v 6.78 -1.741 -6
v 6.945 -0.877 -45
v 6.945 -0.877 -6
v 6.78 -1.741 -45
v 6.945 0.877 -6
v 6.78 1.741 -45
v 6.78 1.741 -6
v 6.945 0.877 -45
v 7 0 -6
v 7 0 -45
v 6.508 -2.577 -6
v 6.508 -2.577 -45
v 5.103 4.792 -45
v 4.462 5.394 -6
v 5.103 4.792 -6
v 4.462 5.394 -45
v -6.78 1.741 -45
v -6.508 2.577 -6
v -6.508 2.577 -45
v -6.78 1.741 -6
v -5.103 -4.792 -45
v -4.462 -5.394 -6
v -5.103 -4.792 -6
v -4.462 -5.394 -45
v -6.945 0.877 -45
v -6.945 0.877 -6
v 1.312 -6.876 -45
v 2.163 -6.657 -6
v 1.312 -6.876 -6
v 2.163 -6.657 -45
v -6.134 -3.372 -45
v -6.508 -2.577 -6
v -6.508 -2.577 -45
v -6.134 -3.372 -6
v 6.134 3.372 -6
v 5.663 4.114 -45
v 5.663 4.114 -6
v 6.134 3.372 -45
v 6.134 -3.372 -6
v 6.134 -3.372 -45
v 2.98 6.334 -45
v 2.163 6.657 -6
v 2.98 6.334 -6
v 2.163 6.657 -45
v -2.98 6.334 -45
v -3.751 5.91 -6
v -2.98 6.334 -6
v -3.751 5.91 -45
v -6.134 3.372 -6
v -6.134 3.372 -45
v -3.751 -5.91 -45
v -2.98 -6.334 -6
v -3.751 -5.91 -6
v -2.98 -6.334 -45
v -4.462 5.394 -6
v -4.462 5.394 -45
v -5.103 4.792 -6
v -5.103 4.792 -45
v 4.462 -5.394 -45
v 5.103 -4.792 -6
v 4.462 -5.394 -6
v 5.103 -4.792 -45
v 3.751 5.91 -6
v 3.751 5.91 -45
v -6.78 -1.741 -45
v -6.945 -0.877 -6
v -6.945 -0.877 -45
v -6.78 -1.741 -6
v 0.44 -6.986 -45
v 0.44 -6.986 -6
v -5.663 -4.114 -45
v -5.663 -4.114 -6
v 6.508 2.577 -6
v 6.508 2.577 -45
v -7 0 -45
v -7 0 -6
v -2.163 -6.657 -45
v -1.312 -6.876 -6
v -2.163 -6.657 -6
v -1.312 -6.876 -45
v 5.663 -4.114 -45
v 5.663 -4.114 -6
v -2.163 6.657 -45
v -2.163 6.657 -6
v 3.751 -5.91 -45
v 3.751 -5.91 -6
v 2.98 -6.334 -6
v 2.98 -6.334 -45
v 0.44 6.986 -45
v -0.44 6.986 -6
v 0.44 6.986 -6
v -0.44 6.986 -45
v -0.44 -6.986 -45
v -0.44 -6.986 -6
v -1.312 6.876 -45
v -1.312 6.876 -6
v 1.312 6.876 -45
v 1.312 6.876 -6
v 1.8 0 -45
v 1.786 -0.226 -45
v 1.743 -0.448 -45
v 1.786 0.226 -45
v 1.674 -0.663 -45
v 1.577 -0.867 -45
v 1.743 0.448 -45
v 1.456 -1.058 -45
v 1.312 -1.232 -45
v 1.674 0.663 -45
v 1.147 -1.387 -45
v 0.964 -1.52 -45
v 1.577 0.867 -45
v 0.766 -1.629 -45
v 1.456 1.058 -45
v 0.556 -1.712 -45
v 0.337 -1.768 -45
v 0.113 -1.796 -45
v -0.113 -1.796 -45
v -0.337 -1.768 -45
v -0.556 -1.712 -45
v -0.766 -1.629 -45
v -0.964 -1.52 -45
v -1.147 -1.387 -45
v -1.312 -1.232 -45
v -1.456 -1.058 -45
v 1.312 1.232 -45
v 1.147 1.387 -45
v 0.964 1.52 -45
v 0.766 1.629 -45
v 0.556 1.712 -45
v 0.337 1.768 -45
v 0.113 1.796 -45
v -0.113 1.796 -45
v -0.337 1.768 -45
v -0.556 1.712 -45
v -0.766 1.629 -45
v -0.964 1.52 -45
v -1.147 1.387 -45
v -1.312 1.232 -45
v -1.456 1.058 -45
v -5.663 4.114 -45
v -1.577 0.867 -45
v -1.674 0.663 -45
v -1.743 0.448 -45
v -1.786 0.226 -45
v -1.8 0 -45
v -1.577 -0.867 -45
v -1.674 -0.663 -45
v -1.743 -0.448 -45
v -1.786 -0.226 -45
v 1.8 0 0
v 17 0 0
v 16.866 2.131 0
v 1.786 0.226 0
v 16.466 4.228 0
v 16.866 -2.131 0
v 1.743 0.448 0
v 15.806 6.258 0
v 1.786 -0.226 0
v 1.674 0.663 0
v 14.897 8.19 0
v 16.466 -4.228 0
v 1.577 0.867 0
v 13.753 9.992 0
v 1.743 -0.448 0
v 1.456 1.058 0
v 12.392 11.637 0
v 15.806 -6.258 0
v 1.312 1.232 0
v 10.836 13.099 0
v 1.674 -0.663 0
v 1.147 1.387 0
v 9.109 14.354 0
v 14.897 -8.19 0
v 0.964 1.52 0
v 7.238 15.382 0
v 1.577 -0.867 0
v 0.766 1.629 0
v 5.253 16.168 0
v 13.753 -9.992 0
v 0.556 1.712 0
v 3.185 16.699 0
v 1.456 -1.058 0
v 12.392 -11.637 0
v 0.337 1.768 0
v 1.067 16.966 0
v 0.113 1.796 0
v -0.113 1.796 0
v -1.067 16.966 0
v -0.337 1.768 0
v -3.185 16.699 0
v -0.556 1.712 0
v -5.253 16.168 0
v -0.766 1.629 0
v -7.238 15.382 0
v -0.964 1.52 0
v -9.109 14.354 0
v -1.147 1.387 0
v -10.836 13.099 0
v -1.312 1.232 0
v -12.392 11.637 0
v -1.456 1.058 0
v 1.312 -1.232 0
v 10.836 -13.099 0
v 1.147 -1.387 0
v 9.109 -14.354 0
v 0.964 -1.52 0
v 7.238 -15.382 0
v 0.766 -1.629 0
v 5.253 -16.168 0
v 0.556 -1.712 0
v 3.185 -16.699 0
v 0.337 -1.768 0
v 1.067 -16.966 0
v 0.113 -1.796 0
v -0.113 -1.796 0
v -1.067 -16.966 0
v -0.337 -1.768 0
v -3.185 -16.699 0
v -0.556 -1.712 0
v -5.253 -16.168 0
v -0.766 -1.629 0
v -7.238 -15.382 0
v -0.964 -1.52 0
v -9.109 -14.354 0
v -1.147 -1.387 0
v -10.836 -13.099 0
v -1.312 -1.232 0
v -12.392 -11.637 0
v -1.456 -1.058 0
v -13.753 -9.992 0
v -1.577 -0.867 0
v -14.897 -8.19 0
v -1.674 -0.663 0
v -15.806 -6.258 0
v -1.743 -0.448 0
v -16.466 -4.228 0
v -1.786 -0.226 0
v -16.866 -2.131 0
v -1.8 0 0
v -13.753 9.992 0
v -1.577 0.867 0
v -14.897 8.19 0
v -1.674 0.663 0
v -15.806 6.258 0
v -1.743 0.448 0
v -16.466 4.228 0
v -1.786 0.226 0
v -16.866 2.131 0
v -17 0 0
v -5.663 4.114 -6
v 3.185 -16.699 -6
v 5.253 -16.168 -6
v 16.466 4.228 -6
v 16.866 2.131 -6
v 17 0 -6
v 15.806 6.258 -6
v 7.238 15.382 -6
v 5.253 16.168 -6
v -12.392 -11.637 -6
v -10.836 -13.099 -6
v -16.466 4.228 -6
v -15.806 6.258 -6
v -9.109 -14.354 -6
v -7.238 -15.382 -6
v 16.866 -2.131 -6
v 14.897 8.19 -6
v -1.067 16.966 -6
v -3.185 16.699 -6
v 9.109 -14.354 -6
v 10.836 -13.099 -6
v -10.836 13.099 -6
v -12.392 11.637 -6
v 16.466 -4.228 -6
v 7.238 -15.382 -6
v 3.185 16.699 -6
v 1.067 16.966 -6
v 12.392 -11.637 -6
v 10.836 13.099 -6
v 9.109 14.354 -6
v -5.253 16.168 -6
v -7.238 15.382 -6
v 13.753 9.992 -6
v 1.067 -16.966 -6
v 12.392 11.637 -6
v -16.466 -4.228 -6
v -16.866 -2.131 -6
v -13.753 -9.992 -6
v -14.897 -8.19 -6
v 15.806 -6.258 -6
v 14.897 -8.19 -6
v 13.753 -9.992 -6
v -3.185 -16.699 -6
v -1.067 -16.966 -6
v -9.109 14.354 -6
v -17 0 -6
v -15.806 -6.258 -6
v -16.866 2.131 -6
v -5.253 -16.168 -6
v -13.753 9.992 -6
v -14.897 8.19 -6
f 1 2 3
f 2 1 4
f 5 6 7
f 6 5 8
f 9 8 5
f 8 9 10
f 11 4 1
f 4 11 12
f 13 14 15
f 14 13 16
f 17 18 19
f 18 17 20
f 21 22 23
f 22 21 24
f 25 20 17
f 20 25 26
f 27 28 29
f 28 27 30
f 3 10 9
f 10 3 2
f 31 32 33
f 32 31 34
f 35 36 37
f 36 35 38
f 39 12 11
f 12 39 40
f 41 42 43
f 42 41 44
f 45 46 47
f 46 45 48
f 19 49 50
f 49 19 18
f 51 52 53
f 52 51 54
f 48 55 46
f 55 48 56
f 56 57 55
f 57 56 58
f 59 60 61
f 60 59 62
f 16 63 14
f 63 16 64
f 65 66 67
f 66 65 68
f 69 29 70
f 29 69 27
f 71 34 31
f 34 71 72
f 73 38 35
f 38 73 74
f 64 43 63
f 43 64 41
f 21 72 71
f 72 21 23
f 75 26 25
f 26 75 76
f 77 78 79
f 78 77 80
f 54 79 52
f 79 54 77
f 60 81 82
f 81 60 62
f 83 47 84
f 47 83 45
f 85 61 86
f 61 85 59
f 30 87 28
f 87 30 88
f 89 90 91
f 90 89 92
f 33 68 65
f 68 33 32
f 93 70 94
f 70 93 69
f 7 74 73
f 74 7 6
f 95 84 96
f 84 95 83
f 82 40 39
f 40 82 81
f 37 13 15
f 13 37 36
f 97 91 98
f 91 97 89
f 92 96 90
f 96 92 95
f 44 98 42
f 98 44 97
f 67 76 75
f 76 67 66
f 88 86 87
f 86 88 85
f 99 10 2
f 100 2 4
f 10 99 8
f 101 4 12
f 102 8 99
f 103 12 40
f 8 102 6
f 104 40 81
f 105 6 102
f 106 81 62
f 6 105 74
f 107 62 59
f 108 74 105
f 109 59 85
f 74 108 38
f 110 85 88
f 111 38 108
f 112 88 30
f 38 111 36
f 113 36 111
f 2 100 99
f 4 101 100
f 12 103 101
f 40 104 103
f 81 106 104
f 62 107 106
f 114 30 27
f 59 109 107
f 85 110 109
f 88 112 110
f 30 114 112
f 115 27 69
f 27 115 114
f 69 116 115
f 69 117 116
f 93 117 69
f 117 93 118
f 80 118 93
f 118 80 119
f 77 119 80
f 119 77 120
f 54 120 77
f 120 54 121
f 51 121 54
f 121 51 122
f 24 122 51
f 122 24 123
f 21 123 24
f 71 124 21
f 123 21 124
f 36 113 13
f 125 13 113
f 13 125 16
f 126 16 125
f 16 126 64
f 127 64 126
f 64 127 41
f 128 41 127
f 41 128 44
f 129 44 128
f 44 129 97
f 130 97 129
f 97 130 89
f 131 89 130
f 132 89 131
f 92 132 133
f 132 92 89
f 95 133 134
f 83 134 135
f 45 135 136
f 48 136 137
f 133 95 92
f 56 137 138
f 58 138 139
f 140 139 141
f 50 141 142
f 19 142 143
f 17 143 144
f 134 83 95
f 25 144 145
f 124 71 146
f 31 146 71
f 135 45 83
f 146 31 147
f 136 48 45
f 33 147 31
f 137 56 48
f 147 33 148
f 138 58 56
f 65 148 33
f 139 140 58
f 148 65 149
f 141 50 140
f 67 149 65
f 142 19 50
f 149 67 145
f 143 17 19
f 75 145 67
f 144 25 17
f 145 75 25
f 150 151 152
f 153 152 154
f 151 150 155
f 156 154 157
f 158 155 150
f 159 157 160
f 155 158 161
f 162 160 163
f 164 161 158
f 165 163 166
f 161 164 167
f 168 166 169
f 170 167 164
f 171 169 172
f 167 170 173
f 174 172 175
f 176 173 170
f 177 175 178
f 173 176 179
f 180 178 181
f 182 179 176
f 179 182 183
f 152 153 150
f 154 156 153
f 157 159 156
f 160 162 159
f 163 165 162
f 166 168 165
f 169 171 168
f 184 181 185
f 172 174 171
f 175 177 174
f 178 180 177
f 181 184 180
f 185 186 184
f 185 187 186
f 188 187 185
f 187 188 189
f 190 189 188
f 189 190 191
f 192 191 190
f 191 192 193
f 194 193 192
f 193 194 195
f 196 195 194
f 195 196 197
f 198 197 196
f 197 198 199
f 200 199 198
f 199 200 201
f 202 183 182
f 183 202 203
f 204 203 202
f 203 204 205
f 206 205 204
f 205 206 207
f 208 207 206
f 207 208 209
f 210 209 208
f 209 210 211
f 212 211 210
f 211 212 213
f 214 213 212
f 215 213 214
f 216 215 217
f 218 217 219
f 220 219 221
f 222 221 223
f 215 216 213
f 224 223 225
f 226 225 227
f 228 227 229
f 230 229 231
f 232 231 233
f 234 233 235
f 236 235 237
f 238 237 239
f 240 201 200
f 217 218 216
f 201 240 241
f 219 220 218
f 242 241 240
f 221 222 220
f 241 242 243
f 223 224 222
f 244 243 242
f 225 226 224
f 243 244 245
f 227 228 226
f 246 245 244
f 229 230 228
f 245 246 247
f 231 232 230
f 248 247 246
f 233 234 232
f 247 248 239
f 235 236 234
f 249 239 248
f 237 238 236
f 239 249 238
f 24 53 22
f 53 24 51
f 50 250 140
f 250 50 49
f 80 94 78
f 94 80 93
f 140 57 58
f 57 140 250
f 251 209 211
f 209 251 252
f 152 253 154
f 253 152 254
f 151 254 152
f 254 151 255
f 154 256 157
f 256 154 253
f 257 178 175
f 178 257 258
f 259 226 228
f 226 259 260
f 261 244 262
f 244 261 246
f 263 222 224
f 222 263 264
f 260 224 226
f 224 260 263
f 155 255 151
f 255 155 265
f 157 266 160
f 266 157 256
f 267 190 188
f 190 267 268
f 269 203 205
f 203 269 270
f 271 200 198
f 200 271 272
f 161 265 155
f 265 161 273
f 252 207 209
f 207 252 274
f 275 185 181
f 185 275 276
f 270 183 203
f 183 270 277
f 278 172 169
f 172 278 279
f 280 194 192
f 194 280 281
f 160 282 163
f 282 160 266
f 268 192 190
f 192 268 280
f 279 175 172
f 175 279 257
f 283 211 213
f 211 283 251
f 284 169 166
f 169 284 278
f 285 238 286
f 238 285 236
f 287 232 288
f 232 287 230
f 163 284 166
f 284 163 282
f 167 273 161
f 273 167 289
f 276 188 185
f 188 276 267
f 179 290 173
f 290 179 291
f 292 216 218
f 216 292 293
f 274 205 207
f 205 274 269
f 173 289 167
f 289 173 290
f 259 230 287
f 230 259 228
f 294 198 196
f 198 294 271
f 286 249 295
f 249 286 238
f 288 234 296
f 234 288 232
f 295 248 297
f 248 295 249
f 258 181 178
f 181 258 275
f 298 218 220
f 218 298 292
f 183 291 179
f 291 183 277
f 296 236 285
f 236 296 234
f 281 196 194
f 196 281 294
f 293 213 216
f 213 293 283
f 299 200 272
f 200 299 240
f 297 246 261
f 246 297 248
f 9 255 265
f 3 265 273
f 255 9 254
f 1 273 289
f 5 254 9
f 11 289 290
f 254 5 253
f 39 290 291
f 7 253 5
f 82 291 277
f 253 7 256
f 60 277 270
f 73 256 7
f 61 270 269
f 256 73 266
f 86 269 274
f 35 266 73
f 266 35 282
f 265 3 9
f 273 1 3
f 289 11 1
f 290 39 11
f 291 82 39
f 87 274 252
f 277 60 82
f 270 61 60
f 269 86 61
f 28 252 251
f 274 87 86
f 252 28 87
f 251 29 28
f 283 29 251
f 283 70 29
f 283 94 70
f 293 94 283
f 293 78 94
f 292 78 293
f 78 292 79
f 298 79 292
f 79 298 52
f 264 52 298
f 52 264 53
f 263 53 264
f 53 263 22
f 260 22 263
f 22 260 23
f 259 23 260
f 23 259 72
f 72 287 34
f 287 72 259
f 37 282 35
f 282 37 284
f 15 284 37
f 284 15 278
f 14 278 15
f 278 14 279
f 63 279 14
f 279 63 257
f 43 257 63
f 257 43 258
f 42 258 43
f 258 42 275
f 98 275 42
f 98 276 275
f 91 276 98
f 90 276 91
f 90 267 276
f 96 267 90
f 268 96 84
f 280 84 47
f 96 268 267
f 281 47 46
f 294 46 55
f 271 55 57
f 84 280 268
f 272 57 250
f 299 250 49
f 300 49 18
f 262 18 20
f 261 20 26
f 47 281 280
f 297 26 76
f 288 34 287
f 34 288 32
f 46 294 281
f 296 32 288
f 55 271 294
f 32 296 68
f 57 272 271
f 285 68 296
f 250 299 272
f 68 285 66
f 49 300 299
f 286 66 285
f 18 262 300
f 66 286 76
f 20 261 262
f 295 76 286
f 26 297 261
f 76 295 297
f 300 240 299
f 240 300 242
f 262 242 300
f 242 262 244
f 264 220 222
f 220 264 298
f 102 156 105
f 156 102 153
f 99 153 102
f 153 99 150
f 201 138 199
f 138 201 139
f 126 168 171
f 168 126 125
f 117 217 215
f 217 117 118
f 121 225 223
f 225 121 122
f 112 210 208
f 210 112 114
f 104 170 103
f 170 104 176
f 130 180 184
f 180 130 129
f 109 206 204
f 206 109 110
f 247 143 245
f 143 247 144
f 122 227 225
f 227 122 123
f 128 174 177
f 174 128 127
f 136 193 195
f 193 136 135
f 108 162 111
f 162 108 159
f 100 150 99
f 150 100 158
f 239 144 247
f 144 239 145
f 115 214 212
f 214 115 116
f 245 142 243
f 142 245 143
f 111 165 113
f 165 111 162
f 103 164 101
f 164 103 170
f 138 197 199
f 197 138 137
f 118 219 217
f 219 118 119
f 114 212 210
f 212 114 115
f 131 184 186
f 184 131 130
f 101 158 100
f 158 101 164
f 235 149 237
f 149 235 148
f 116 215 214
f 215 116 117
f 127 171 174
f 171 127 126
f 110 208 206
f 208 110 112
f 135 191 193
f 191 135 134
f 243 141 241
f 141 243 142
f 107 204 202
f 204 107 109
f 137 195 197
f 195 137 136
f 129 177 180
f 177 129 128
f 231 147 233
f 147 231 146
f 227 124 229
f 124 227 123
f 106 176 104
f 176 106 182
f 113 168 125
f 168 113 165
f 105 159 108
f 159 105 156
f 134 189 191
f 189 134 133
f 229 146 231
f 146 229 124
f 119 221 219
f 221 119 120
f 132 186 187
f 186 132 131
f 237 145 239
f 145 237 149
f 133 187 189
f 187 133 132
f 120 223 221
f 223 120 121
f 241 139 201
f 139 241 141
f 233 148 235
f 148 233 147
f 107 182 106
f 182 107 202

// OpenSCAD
$fn = 50;


difference() {
	union() {
		translate(v = [0, 0, -45.0000000000]) {
			cylinder(h = 45, r = 7.0000000000);
		}
		translate(v = [0, 0, -6.0000000000]) {
			cylinder(h = 6, r = 17.0000000000);
		}
	}
	union() {
		#translate(v = [0, 0, -45]) {
			cylinder(h = 45, r = 1.8000000000);
		}
	}
}
